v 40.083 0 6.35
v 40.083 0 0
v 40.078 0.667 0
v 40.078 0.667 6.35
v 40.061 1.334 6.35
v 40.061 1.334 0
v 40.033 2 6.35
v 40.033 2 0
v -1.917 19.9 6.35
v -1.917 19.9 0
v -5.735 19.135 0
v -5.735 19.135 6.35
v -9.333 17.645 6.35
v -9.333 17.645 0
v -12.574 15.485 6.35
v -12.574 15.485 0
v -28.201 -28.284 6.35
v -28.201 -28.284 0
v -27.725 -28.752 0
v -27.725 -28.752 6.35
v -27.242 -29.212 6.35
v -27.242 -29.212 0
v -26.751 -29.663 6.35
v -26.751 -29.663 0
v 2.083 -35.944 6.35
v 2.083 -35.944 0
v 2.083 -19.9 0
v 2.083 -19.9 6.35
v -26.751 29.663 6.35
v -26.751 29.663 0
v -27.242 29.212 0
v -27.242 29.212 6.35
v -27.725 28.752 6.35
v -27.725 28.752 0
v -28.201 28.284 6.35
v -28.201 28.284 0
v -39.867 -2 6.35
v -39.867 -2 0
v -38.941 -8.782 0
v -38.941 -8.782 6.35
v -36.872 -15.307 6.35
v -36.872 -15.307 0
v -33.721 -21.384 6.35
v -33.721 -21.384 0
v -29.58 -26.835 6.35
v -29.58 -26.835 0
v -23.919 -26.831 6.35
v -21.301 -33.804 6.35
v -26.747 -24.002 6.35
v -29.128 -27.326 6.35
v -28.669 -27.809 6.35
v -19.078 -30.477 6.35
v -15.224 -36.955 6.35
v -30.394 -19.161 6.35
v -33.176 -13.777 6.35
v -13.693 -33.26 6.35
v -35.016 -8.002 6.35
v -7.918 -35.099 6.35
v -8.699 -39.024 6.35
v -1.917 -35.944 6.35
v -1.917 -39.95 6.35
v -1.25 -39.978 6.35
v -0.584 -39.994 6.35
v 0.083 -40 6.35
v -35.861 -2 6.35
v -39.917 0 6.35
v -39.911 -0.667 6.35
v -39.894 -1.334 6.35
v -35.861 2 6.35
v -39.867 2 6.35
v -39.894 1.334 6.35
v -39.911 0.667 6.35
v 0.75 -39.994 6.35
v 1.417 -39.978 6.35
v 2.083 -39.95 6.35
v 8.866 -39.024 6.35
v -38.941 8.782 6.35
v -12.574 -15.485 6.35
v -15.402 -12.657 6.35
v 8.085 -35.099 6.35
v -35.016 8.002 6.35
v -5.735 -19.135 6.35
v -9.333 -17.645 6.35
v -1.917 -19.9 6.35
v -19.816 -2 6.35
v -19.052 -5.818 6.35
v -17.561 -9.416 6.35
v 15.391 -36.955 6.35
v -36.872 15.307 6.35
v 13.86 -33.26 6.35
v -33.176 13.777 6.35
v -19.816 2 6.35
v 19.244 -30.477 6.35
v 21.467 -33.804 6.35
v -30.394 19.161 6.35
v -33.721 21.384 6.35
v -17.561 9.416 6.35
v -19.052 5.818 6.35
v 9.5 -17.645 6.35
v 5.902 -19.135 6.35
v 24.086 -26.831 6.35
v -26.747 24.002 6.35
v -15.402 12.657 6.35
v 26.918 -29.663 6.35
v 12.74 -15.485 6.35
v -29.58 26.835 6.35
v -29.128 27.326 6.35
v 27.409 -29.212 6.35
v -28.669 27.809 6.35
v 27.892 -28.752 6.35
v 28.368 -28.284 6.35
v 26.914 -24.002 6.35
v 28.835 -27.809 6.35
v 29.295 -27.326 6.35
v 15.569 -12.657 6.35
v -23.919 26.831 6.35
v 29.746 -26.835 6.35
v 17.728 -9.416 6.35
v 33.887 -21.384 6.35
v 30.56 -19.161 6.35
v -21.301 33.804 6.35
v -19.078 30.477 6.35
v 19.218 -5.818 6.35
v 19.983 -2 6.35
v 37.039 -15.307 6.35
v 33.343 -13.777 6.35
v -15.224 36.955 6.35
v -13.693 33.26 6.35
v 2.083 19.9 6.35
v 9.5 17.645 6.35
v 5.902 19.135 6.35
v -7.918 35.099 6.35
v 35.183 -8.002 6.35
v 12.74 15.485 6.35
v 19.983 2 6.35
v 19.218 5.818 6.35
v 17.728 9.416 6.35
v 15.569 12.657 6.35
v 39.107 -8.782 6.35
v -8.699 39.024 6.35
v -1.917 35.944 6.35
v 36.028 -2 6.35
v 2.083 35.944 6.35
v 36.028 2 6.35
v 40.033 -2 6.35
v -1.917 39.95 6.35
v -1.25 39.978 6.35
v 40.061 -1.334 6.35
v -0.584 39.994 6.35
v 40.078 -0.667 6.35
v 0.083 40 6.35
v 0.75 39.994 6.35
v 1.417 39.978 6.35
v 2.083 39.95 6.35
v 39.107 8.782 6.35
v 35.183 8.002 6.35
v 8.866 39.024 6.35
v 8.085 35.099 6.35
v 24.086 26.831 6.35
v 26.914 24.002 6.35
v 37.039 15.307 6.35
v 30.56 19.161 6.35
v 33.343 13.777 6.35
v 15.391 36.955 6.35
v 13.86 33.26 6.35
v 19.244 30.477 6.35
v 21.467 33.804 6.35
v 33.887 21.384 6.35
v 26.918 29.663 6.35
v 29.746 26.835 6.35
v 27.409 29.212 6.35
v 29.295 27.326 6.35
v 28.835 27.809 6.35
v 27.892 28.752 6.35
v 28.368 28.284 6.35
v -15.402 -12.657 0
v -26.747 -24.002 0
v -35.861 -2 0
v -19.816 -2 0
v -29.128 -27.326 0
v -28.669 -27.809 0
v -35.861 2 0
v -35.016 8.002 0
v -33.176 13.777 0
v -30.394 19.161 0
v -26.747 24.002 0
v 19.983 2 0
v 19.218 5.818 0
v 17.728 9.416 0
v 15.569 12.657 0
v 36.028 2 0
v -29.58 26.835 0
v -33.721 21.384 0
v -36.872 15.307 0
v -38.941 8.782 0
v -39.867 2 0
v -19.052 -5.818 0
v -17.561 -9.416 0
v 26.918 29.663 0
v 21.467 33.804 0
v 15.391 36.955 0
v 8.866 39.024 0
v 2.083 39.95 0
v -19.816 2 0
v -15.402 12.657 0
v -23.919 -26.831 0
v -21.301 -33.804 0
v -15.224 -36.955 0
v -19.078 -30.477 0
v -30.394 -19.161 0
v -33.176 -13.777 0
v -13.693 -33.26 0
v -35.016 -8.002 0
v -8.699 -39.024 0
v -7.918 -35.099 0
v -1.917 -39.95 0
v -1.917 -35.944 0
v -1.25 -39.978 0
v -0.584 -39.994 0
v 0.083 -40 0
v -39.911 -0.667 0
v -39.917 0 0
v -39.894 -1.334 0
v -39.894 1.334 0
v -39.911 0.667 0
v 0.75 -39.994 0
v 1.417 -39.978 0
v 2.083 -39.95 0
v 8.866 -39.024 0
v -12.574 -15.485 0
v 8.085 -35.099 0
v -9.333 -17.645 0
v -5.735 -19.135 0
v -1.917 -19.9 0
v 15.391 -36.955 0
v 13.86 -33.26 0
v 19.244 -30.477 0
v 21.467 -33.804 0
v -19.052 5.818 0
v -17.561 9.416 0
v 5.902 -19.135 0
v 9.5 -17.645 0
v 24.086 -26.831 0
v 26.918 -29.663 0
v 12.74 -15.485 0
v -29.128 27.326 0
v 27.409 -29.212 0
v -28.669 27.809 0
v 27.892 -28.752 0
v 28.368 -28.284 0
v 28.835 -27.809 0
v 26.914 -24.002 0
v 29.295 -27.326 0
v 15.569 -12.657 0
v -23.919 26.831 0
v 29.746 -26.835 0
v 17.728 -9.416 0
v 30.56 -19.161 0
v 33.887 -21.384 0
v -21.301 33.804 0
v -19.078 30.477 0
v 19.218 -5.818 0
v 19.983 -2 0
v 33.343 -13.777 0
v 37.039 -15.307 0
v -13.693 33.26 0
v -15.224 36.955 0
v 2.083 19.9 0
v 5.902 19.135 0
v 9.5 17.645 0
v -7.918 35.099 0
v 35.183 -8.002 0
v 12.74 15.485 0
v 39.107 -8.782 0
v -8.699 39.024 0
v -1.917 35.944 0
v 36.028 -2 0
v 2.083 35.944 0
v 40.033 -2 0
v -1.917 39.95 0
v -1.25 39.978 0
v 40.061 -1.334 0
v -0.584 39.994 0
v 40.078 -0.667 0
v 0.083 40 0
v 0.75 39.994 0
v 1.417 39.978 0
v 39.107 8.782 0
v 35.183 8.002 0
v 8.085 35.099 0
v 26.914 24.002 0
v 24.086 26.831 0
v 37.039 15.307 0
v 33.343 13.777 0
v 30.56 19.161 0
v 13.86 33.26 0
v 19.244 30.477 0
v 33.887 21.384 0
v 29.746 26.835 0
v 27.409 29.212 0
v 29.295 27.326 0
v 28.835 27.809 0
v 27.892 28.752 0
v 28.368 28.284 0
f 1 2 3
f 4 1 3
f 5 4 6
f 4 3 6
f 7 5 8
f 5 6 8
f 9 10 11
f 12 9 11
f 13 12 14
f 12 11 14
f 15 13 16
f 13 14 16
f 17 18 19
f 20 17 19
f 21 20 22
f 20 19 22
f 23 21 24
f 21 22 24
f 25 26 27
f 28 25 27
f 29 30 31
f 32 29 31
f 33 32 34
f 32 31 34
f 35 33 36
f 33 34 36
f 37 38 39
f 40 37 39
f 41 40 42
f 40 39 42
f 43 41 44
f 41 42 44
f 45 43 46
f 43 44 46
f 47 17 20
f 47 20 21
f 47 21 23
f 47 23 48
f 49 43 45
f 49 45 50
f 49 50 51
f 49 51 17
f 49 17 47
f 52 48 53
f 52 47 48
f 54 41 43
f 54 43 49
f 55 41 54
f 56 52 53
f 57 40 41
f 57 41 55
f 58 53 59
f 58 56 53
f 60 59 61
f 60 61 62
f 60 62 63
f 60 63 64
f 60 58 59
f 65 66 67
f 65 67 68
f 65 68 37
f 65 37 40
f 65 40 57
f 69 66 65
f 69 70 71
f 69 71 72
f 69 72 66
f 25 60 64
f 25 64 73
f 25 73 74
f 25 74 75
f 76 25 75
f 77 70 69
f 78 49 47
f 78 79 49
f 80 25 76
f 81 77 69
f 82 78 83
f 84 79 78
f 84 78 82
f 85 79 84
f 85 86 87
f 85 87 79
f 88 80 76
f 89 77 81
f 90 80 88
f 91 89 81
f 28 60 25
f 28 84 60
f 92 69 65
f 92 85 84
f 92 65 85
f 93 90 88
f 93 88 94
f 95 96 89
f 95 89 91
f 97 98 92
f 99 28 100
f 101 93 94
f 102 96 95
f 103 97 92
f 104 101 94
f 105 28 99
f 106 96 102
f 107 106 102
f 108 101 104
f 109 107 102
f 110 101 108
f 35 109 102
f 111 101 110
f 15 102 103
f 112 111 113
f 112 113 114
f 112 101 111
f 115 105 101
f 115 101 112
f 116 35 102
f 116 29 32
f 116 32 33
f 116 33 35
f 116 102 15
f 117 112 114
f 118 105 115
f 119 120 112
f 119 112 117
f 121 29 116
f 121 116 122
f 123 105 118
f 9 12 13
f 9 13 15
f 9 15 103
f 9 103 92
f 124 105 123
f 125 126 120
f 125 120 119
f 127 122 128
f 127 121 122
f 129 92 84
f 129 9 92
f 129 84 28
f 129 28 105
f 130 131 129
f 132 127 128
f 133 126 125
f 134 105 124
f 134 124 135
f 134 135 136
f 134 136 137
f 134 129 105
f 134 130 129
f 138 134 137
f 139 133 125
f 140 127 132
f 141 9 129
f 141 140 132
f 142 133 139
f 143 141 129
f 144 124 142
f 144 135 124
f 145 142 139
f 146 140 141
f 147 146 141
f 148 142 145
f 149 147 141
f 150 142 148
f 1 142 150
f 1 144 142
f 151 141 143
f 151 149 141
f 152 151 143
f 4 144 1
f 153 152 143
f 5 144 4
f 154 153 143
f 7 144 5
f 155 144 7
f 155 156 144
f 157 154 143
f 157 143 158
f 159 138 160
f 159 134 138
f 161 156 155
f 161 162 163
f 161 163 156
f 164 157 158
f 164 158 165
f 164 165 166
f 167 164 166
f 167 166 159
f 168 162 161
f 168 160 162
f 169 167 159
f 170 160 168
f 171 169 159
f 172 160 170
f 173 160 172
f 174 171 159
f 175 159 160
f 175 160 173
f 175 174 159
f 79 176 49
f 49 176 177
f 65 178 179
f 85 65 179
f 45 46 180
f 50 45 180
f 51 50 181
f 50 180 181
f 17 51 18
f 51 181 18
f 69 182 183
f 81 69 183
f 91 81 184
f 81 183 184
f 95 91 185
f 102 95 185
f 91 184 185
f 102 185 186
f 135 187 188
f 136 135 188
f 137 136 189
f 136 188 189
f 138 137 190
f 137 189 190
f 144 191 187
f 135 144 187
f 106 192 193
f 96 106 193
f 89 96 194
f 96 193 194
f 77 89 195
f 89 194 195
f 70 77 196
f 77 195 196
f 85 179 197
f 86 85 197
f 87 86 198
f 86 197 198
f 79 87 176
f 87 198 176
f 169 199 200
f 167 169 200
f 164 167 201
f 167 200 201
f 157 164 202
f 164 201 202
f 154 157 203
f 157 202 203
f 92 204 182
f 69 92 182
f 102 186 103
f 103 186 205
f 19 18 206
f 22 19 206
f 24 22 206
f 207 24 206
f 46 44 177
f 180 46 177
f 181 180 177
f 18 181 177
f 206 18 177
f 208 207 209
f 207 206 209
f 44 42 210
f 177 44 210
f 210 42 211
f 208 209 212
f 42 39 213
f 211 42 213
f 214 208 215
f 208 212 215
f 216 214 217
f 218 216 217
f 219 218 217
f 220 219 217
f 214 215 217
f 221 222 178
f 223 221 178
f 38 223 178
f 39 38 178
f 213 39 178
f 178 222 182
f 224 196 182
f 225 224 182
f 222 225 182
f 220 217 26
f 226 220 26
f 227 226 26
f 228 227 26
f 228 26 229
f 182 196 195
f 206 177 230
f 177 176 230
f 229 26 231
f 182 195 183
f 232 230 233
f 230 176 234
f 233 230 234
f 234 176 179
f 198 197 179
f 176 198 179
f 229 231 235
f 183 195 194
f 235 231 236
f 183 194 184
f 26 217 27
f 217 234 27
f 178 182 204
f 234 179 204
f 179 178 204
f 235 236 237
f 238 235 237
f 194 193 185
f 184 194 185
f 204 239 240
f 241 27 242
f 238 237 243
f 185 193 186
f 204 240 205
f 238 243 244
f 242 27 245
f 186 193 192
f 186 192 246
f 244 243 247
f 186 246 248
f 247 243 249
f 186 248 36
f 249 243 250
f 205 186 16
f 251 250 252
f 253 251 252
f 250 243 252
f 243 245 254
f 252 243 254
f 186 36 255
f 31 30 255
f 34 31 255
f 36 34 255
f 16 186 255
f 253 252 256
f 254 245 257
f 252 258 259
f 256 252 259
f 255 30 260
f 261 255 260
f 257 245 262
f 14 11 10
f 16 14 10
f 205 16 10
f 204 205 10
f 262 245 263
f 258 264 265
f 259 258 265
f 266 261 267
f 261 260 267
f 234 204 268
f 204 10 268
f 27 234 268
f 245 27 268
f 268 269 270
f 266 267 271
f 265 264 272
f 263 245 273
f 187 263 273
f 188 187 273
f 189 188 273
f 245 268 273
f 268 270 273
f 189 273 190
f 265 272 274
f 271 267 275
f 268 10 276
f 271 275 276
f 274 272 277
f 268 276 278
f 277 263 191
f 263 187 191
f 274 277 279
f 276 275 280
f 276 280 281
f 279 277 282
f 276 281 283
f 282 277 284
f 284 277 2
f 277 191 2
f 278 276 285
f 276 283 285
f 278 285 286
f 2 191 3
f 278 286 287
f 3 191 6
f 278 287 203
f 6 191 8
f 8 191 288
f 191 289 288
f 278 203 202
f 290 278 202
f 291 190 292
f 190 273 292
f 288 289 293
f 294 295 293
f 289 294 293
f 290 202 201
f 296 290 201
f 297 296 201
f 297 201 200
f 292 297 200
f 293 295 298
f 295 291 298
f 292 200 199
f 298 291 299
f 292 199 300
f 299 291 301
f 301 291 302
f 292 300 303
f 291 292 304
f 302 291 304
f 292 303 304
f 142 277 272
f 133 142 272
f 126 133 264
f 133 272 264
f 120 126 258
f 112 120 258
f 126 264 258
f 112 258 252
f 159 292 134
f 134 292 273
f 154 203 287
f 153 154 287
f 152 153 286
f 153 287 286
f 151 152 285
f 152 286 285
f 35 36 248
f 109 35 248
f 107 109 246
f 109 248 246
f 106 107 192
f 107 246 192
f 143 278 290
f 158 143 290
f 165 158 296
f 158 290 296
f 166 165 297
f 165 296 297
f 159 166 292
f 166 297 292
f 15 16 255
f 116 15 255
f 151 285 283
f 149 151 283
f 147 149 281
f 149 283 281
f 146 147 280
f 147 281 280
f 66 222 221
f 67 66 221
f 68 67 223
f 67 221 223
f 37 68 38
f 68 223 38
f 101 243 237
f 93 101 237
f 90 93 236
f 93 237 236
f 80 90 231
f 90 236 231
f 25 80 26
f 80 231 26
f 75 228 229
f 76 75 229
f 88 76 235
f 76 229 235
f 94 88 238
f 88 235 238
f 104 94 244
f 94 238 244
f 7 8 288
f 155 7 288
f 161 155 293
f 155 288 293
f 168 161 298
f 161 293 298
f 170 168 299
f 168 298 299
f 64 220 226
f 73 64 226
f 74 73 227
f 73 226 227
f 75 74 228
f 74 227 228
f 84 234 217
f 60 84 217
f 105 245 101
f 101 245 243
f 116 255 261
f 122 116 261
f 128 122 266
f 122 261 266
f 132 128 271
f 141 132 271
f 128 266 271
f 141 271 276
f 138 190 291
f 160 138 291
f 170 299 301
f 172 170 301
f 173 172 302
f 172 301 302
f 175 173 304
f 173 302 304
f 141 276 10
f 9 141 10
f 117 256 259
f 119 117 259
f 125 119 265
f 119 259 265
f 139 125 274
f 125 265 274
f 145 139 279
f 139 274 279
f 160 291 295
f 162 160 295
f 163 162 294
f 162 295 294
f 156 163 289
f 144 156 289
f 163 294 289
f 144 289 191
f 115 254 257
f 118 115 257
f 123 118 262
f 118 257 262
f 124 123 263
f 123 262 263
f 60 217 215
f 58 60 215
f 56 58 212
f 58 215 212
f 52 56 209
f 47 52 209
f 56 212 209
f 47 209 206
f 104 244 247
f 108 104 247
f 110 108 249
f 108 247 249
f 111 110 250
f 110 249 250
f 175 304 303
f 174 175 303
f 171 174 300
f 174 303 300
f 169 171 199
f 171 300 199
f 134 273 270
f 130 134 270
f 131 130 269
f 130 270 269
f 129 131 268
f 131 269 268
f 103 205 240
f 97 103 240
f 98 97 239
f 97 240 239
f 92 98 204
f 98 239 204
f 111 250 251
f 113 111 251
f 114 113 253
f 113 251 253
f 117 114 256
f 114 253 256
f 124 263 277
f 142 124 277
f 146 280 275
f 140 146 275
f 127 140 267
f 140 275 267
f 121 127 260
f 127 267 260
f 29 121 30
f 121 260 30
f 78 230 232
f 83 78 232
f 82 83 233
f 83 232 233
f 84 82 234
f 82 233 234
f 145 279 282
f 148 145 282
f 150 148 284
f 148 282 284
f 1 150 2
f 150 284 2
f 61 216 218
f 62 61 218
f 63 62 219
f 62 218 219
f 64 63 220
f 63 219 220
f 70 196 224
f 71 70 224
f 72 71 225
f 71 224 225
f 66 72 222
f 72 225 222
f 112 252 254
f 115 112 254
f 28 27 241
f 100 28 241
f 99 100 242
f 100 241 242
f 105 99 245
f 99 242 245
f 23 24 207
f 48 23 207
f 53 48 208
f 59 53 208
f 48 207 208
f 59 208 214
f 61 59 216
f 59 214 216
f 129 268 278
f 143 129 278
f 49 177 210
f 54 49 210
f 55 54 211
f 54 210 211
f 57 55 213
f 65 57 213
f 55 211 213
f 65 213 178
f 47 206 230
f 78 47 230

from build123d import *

# Parameters (mm, degrees)
F1_DEPTH = 6.35


with BuildPart() as f1:
    # F0 (on Top) → F1 (new body)
    with BuildSketch(Plane.XY):
        with BuildLine():
            Line((24.0856498252, 26.8307436167), (26.9180135546, 29.663107346))
            ThreePointArc((26.9180135546, 29.663107346), (15.3906706279, 36.9551813005), (2.0833333333, 39.9499687109))
            Line((2.0833333333, 39.9499687109), (2.0833333333, 35.9444015112))
            ThreePointArc((2.0833333333, 35.9444015112), (13.8599368985, 33.2596631704), (24.0856498252, 26.8307436167))
        make_face()
        with BuildLine():
            Line((2.0833333333, 35.9444015112), (2.0833333333, 39.9499687109))
            ThreePointArc((2.0833333333, 39.9499687109), (1.0836461756, 39.9874902215), (0.0833333333, 40))
            ThreePointArc((0.0833333333, 40), (-0.916979509, 39.9874902215), (-1.9166666667, 39.9499687109))
            Line((-1.9166666667, 39.9499687109), (-1.9166666667, 35.9444015112))
            ThreePointArc((-1.9166666667, 35.9444015112), (0.0833333333, 36), (2.0833333333, 35.9444015112))
        make_face()
        with BuildLine():
            ThreePointArc((-23.9189831586, 26.8307436167), (-13.6932702318, 33.2596631704), (-1.9166666667, 35.9444015112))
            Line((-1.9166666667, 35.9444015112), (-1.9166666667, 39.9499687109))
            ThreePointArc((-1.9166666667, 39.9499687109), (-15.2240039613, 36.9551813005), (-26.7513468879, 29.663107346))
            Line((-26.7513468879, 29.663107346), (-23.9189831586, 26.8307436167))
        make_face()
        with BuildLine():
            ThreePointArc((-26.7474102833, 24.0023164919), (-25.3725107894, 25.4558441227), (-23.9189831586, 26.8307436167))
            Line((-23.9189831586, 26.8307436167), (-26.7513468879, 29.663107346))
            ThreePointArc((-26.7513468879, 29.663107346), (-27.4847641715, 28.9827534917), (-28.2009379154, 28.2842712462))
            ThreePointArc((-28.2009379154, 28.2842712462), (-28.8994201597, 27.5680975035), (-29.5797740127, 26.8346802213))
            Line((-29.5797740127, 26.8346802213), (-26.7474102833, 24.0023164919))
        make_face()
        with BuildLine():
            ThreePointArc((-35.8610681779, 2), (-33.1763298371, 13.7766035651), (-26.7474102833, 24.0023164919))
            Line((-26.7474102833, 24.0023164919), (-29.5797740127, 26.8346802213))
            ThreePointArc((-29.5797740127, 26.8346802213), (-36.8718479671, 15.3073372946), (-39.8666353775, 2))
            Line((-39.8666353775, 2), (-35.8610681779, 2))
        make_face()
        with BuildLine():
            ThreePointArc((-35.8610681779, -2), (-35.9166666667, 0), (-35.8610681779, 2))
            Line((-35.8610681779, 2), (-39.8666353775, 2))
            ThreePointArc((-39.8666353775, 2), (-39.9041568884, 1.000312836), (-39.9166666667, -1.26e-08))
            ThreePointArc((-39.9166666667, -1.26e-08), (-39.904156888, -1.0003128486), (-39.8666353775, -2))
            Line((-39.8666353775, -2), (-35.8610681779, -2))
        make_face()
        with BuildLine():
            Line((-29.5797740127, -26.8346802213), (-26.7474102833, -24.0023164919))
            ThreePointArc((-26.7474102833, -24.0023164919), (-33.1763298371, -13.7766035651), (-35.8610681779, -2))
            Line((-35.8610681779, -2), (-39.8666353775, -2))
            ThreePointArc((-39.8666353775, -2), (-36.8718479671, -15.3073372946), (-29.5797740127, -26.8346802213))
        make_face()
        with BuildLine():
            Line((-26.7513468879, -29.663107346), (-23.9189831586, -26.8307436167))
            ThreePointArc((-23.9189831586, -26.8307436167), (-25.3725107894, -25.4558441227), (-26.7474102833, -24.0023164919))
            Line((-26.7474102833, -24.0023164919), (-29.5797740127, -26.8346802213))
            ThreePointArc((-29.5797740127, -26.8346802213), (-28.899420159, -27.5680975042), (-28.2009379141, -28.2842712475))
            ThreePointArc((-28.2009379141, -28.2842712475), (-27.4847641708, -28.9827534924), (-26.7513468879, -29.663107346))
        make_face()
        with BuildLine():
            Line((-1.9166666667, -39.9499687109), (-1.9166666667, -35.9444015112))
            ThreePointArc((-1.9166666667, -35.9444015112), (-13.6932702318, -33.2596631704), (-23.9189831586, -26.8307436167))
            Line((-23.9189831586, -26.8307436167), (-26.7513468879, -29.663107346))
            ThreePointArc((-26.7513468879, -29.663107346), (-15.2240039613, -36.9551813005), (-1.9166666667, -39.9499687109))
        make_face()
        with BuildLine():
            ThreePointArc((0.0833333333, -40), (1.0836461756, -39.9874902215), (2.0833333333, -39.9499687109))
            Line((2.0833333333, -39.9499687109), (2.0833333333, -35.9444015112))
            ThreePointArc((2.0833333333, -35.9444015112), (0.0833333333, -36), (-1.9166666667, -35.9444015112))
            Line((-1.9166666667, -35.9444015112), (-1.9166666667, -39.9499687109))
            ThreePointArc((-1.9166666667, -39.9499687109), (-0.916979509, -39.9874902215), (0.0833333333, -40))
        make_face()
        with BuildLine():
            ThreePointArc((2.0833333333, -39.9499687109), (15.3906706279, -36.9551813005), (26.9180135546, -29.663107346))
            Line((26.9180135546, -29.663107346), (24.0856498252, -26.8307436167))
            ThreePointArc((24.0856498252, -26.8307436167), (13.8599368985, -33.2596631704), (2.0833333333, -35.9444015112))
            Line((2.0833333333, -35.9444015112), (2.0833333333, -39.9499687109))
        make_face()
        with BuildLine():
            ThreePointArc((28.3676046423, -28.2842711859), (29.0660868557, -27.5680974727), (29.7464406794, -26.8346802213))
            Line((29.7464406794, -26.8346802213), (26.91407695, -24.0023164919))
            ThreePointArc((26.91407695, -24.0023164919), (25.539177456, -25.4558441227), (24.0856498252, -26.8307436167))
            Line((24.0856498252, -26.8307436167), (26.9180135546, -29.663107346))
            ThreePointArc((26.9180135546, -29.663107346), (27.651430869, -28.9827534624), (28.3676046423, -28.2842711859))
        make_face()
        with BuildLine():
            ThreePointArc((29.7464406794, -26.8346802213), (37.0385146338, -15.3073372946), (40.0333020442, -2))
            Line((40.0333020442, -2), (36.0277348446, -2))
            ThreePointArc((36.0277348446, -2), (33.3429965037, -13.7766035651), (26.91407695, -24.0023164919))
            Line((26.91407695, -24.0023164919), (29.7464406794, -26.8346802213))
        make_face()
        with BuildLine():
            ThreePointArc((40.0333020442, -2), (40.0708235549, -1.0003128423), (40.0833333333, 0))
            ThreePointArc((40.0833333333, 0), (40.0708235549, 1.0003128423), (40.0333020442, 2))
            Line((40.0333020442, 2), (36.0277348446, 2))
            ThreePointArc((36.0277348446, 2), (36.0694310268, 1.0003863244), (36.0833333333, 0))
            ThreePointArc((36.0833333333, 0), (36.0694310268, -1.0003863244), (36.0277348446, -2))
            Line((36.0277348446, -2), (40.0333020442, -2))
        make_face()
        with BuildLine():
            Line((36.0277348446, 2), (40.0333020442, 2))
            ThreePointArc((40.0333020442, 2), (37.0385146338, 15.3073372946), (29.7464406794, 26.8346802213))
            Line((29.7464406794, 26.8346802213), (26.91407695, 24.0023164919))
            ThreePointArc((26.91407695, 24.0023164919), (33.3429965037, 13.7766035651), (36.0277348446, 2))
        make_face()
        with BuildLine():
            Line((26.91407695, 24.0023164919), (29.7464406794, 26.8346802213))
            ThreePointArc((29.7464406794, 26.8346802213), (29.0660868257, 27.5680975042), (28.3676045808, 28.2842712475))
            ThreePointArc((28.3676045808, 28.2842712475), (27.6514308375, 28.9827534924), (26.9180135546, 29.663107346))
            Line((26.9180135546, 29.663107346), (24.0856498252, 26.8307436167))
            ThreePointArc((24.0856498252, 26.8307436167), (25.539177456, 25.4558441227), (26.91407695, 24.0023164919))
        make_face()
        with BuildLine():
            Line((15.5687941752, 12.6570337171), (26.91407695, 24.0023164919))
            ThreePointArc((26.91407695, 24.0023164919), (25.539177456, 25.4558441227), (24.0856498252, 26.8307436167))
            Line((24.0856498252, 26.8307436167), (12.7403670504, 15.4854608418))
            ThreePointArc((12.7403670504, 15.4854608418), (14.2254689571, 14.1421356237), (15.5687941752, 12.6570337171))
        make_face()
        with BuildLine():
            ThreePointArc((36.0833333333, 0), (36.0694310268, 1.0003863244), (36.0277348446, 2))
            Line((36.0277348446, 2), (19.9830820755, 2))
            ThreePointArc((19.9830820755, 2), (20.0582547955, 1.0012555012), (20.0833333333, 0))
            ThreePointArc((20.0833333333, 0), (20.0582547955, -1.0012555012), (19.9830820755, -2))
            Line((19.9830820755, -2), (36.0277348446, -2))
            ThreePointArc((36.0277348446, -2), (36.0694310268, -1.0003863244), (36.0833333333, 0))
        make_face()
        with BuildLine():
            ThreePointArc((24.0856498252, -26.8307436167), (25.539177456, -25.4558441227), (26.91407695, -24.0023164919))
            Line((26.91407695, -24.0023164919), (15.5687941752, -12.6570337171))
            ThreePointArc((15.5687941752, -12.6570337171), (14.2254689571, -14.1421356237), (12.7403670504, -15.4854608418))
            Line((12.7403670504, -15.4854608418), (24.0856498252, -26.8307436167))
        make_face()
        with BuildLine():
            ThreePointArc((-1.9166666667, -35.9444015112), (0.0833333333, -36), (2.0833333333, -35.9444015112))
            Line((2.0833333333, -35.9444015112), (2.0833333333, -19.8997487421))
            ThreePointArc((2.0833333333, -19.8997487421), (0.0833333333, -20), (-1.9166666667, -19.8997487421))
            Line((-1.9166666667, -19.8997487421), (-1.9166666667, -35.9444015112))
        make_face()
        with BuildLine():
            ThreePointArc((-26.7474102833, -24.0023164919), (-25.3725107894, -25.4558441227), (-23.9189831586, -26.8307436167))
            Line((-23.9189831586, -26.8307436167), (-12.5737003838, -15.4854608418))
            ThreePointArc((-12.5737003838, -15.4854608418), (-14.0588022904, -14.1421356237), (-15.4021275085, -12.6570337171))
            Line((-15.4021275085, -12.6570337171), (-26.7474102833, -24.0023164919))
        make_face()
        with BuildLine():
            Line((-19.8164154088, 2), (-35.8610681779, 2))
            ThreePointArc((-35.8610681779, 2), (-35.9166666667, 0), (-35.8610681779, -2))
            Line((-35.8610681779, -2), (-19.8164154088, -2))
            ThreePointArc((-19.8164154088, -2), (-19.9166666667, 0), (-19.8164154088, 2))
        make_face()
        with BuildLine():
            Line((-12.5737003838, 15.4854608418), (-23.9189831586, 26.8307436167))
            ThreePointArc((-23.9189831586, 26.8307436167), (-25.3725107894, 25.4558441227), (-26.7474102833, 24.0023164919))
            Line((-26.7474102833, 24.0023164919), (-15.4021275085, 12.6570337171))
            ThreePointArc((-15.4021275085, 12.6570337171), (-14.0588022904, 14.1421356237), (-12.5737003838, 15.4854608418))
        make_face()
        with BuildLine():
            Line((2.0833333333, 19.8997487421), (2.0833333333, 35.9444015112))
            ThreePointArc((2.0833333333, 35.9444015112), (0.0833333333, 36), (-1.9166666667, 35.9444015112))
            Line((-1.9166666667, 35.9444015112), (-1.9166666667, 19.8997487421))
            ThreePointArc((-1.9166666667, 19.8997487421), (0.0833333333, 20), (2.0833333333, 19.8997487421))
        make_face()
        with BuildLine():
            Line((2.0833333333, 4.8284271247), (2.0833333333, 19.8997487421))
            ThreePointArc((2.0833333333, 19.8997487421), (0.0833333333, 20), (-1.9166666667, 19.8997487421))
            Line((-1.9166666667, 19.8997487421), (-1.9166666667, 4.8284271247))
            Line((-1.9166666667, 4.8284271247), (0.0833333333, 2.8284271247))
            Line((0.0833333333, 2.8284271247), (2.0833333333, 4.8284271247))
        make_face()
        with BuildLine():
            Line((2.0833333333, 4.8284271247), (12.7403670504, 15.4854608418))
            ThreePointArc((12.7403670504, 15.4854608418), (7.7370019806, 18.4775906502), (2.0833333333, 19.8997487421))
            Line((2.0833333333, 19.8997487421), (2.0833333333, 4.8284271247))
        make_face()
        with BuildLine():
            Line((4.9117604581, 2), (15.5687941752, 12.6570337171))
            ThreePointArc((15.5687941752, 12.6570337171), (14.2254689571, 14.1421356237), (12.7403670504, 15.4854608418))
            Line((12.7403670504, 15.4854608418), (2.0833333333, 4.8284271247))
            Line((2.0833333333, 4.8284271247), (2.0833333333, 2))
            Line((2.0833333333, 2), (4.9117604581, 2))
        make_face()
        with BuildLine():
            ThreePointArc((20.0833333333, 0), (20.0582547955, 1.0012555012), (19.9830820755, 2))
            Line((19.9830820755, 2), (4.9117604581, 2))
            Line((4.9117604581, 2), (2.9117604581, 0))
            Line((2.9117604581, 0), (4.9117604581, -2))
            Line((4.9117604581, -2), (19.9830820755, -2))
            ThreePointArc((19.9830820755, -2), (20.0582547955, -1.0012555012), (20.0833333333, 0))
        make_face()
        with BuildLine():
            Line((4.9117604581, 2), (19.9830820755, 2))
            ThreePointArc((19.9830820755, 2), (18.5609239836, 7.6536686473), (15.5687941752, 12.6570337171))
            Line((15.5687941752, 12.6570337171), (4.9117604581, 2))
        make_face()
        with BuildLine():
            ThreePointArc((15.5687941752, -12.6570337171), (18.5609239836, -7.6536686473), (19.9830820755, -2))
            Line((19.9830820755, -2), (4.9117604581, -2))
            Line((4.9117604581, -2), (15.5687941752, -12.6570337171))
        make_face()
        with BuildLine():
            ThreePointArc((12.7403670504, -15.4854608418), (14.2254689571, -14.1421356237), (15.5687941752, -12.6570337171))
            Line((15.5687941752, -12.6570337171), (4.9117604581, -2))
            Line((4.9117604581, -2), (2.0833333333, -2))
            Line((2.0833333333, -2), (2.0833333333, -4.8284271247))
            Line((2.0833333333, -4.8284271247), (12.7403670504, -15.4854608418))
        make_face()
        with BuildLine():
            ThreePointArc((2.0833333333, -19.8997487421), (7.7370019806, -18.4775906502), (12.7403670504, -15.4854608418))
            Line((12.7403670504, -15.4854608418), (2.0833333333, -4.8284271247))
            Line((2.0833333333, -4.8284271247), (2.0833333333, -19.8997487421))
        make_face()
        with BuildLine():
            ThreePointArc((-1.9166666667, -19.8997487421), (0.0833333333, -20), (2.0833333333, -19.8997487421))
            Line((2.0833333333, -19.8997487421), (2.0833333333, -4.8284271247))
            Line((2.0833333333, -4.8284271247), (0.0833333333, -2.8284271247))
            Line((0.0833333333, -2.8284271247), (-1.9166666667, -4.8284271247))
            Line((-1.9166666667, -4.8284271247), (-1.9166666667, -19.8997487421))
        make_face()
        with BuildLine():
            ThreePointArc((-12.5737003838, -15.4854608418), (-7.570335314, -18.4775906502), (-1.9166666667, -19.8997487421))
            Line((-1.9166666667, -19.8997487421), (-1.9166666667, -4.8284271247))
            Line((-1.9166666667, -4.8284271247), (-12.5737003838, -15.4854608418))
        make_face()
        with BuildLine():
            ThreePointArc((-15.4021275085, -12.6570337171), (-14.0588022904, -14.1421356237), (-12.5737003838, -15.4854608418))
            Line((-12.5737003838, -15.4854608418), (-1.9166666667, -4.8284271247))
            Line((-1.9166666667, -4.8284271247), (-1.9166666667, -2))
            Line((-1.9166666667, -2), (-4.7450937914, -2))
            Line((-4.7450937914, -2), (-15.4021275085, -12.6570337171))
        make_face()
        with BuildLine():
            ThreePointArc((-19.8164154088, -2), (-18.3942573169, -7.6536686473), (-15.4021275085, -12.6570337171))
            Line((-15.4021275085, -12.6570337171), (-4.7450937914, -2))
            Line((-4.7450937914, -2), (-19.8164154088, -2))
        make_face()
        with BuildLine():
            Line((-2.7450937914, 0), (-4.7450937914, 2))
            Line((-4.7450937914, 2), (-19.8164154088, 2))
            ThreePointArc((-19.8164154088, 2), (-19.9166666667, 0), (-19.8164154088, -2))
            Line((-19.8164154088, -2), (-4.7450937914, -2))
            Line((-4.7450937914, -2), (-2.7450937914, 0))
        make_face()
        with BuildLine():
            Line((-4.7450937914, 2), (-15.4021275085, 12.6570337171))
            ThreePointArc((-15.4021275085, 12.6570337171), (-18.3942573169, 7.6536686473), (-19.8164154088, 2))
            Line((-19.8164154088, 2), (-4.7450937914, 2))
        make_face()
        with BuildLine():
            Line((-1.9166666667, 4.8284271247), (-12.5737003838, 15.4854608418))
            ThreePointArc((-12.5737003838, 15.4854608418), (-14.0588022904, 14.1421356237), (-15.4021275085, 12.6570337171))
            Line((-15.4021275085, 12.6570337171), (-4.7450937914, 2))
            Line((-4.7450937914, 2), (-1.9166666667, 2))
            Line((-1.9166666667, 2), (-1.9166666667, 4.8284271247))
        make_face()
        with BuildLine():
            Line((-1.9166666667, 4.8284271247), (-1.9166666667, 19.8997487421))
            ThreePointArc((-1.9166666667, 19.8997487421), (-7.570335314, 18.4775906502), (-12.5737003838, 15.4854608418))
            Line((-12.5737003838, 15.4854608418), (-1.9166666667, 4.8284271247))
        make_face()
        Polygon((2.9117604581, 0), (4.9117604581, 2), (2.0833333333, 2), (2.0833333333, 0.8284271247), align=None)
        Polygon((2.0833333333, -2), (4.9117604581, -2), (2.9117604581, 0), (2.0833333333, -0.8284271247), align=None)
        Polygon((2.0833333333, -4.8284271247), (2.0833333333, -2), (0.9117604581, -2), (0.0833333333, -2.8284271247), align=None)
        Polygon((-1.9166666667, -4.8284271247), (0.0833333333, -2.8284271247), (-0.7450937914, -2), (-1.9166666667, -2), align=None)
        Polygon((-1.9166666667, 0.8284271247), (-1.9166666667, 2), (-4.7450937914, 2), (-2.7450937914, 0), align=None)
        Polygon((0.9117604581, 2), (2.0833333333, 2), (2.0833333333, 4.8284271247), (0.0833333333, 2.8284271247), align=None)
        Polygon((2.0833333333, -0.8284271247), (2.9117604581, 0), (2.0833333333, 0.8284271247), align=None)
        Polygon((0.9117604581, -2), (2.0833333333, -2), (2.0833333333, -0.8284271247), align=None)
        Polygon((0.0833333333, -2.8284271247), (0.9117604581, -2), (-0.7450937914, -2), align=None)
        Polygon((-1.9166666667, -0.8284271247), (-1.9166666667, 0.8284271247), (-2.7450937914, 0), align=None)
        Polygon((-1.9166666667, 0.8284271247), (-0.7450937914, 2), (-1.9166666667, 2), align=None)
        Polygon((-0.7450937914, 2), (0.0833333333, 2.8284271247), (-1.9166666667, 4.8284271247), (-1.9166666667, 2), align=None)
        Polygon((-0.7450937914, 2), (0.9117604581, 2), (0.0833333333, 2.8284271247), align=None)
        Polygon((-4.7450937914, -2), (-1.9166666667, -2), (-1.9166666667, -0.8284271247), (-2.7450937914, 0), align=None)
        Polygon((2.0833333333, -0.8284271247), (2.0833333333, 0.8284271247), (0.9117604581, 2), (-0.7450937914, 2), (-1.9166666667, 0.8284271247), (-1.9166666667, -0.8284271247), (-0.7450937914, -2), (0.9117604581, -2), align=None)
        Polygon((-1.9166666667, -2), (-0.7450937914, -2), (-1.9166666667, -0.8284271247), align=None)
        Polygon((2.0833333333, 0.8284271247), (2.0833333333, 2), (0.9117604581, 2), align=None)
    extrude(amount=F1_DEPTH)


solid = f1.part
